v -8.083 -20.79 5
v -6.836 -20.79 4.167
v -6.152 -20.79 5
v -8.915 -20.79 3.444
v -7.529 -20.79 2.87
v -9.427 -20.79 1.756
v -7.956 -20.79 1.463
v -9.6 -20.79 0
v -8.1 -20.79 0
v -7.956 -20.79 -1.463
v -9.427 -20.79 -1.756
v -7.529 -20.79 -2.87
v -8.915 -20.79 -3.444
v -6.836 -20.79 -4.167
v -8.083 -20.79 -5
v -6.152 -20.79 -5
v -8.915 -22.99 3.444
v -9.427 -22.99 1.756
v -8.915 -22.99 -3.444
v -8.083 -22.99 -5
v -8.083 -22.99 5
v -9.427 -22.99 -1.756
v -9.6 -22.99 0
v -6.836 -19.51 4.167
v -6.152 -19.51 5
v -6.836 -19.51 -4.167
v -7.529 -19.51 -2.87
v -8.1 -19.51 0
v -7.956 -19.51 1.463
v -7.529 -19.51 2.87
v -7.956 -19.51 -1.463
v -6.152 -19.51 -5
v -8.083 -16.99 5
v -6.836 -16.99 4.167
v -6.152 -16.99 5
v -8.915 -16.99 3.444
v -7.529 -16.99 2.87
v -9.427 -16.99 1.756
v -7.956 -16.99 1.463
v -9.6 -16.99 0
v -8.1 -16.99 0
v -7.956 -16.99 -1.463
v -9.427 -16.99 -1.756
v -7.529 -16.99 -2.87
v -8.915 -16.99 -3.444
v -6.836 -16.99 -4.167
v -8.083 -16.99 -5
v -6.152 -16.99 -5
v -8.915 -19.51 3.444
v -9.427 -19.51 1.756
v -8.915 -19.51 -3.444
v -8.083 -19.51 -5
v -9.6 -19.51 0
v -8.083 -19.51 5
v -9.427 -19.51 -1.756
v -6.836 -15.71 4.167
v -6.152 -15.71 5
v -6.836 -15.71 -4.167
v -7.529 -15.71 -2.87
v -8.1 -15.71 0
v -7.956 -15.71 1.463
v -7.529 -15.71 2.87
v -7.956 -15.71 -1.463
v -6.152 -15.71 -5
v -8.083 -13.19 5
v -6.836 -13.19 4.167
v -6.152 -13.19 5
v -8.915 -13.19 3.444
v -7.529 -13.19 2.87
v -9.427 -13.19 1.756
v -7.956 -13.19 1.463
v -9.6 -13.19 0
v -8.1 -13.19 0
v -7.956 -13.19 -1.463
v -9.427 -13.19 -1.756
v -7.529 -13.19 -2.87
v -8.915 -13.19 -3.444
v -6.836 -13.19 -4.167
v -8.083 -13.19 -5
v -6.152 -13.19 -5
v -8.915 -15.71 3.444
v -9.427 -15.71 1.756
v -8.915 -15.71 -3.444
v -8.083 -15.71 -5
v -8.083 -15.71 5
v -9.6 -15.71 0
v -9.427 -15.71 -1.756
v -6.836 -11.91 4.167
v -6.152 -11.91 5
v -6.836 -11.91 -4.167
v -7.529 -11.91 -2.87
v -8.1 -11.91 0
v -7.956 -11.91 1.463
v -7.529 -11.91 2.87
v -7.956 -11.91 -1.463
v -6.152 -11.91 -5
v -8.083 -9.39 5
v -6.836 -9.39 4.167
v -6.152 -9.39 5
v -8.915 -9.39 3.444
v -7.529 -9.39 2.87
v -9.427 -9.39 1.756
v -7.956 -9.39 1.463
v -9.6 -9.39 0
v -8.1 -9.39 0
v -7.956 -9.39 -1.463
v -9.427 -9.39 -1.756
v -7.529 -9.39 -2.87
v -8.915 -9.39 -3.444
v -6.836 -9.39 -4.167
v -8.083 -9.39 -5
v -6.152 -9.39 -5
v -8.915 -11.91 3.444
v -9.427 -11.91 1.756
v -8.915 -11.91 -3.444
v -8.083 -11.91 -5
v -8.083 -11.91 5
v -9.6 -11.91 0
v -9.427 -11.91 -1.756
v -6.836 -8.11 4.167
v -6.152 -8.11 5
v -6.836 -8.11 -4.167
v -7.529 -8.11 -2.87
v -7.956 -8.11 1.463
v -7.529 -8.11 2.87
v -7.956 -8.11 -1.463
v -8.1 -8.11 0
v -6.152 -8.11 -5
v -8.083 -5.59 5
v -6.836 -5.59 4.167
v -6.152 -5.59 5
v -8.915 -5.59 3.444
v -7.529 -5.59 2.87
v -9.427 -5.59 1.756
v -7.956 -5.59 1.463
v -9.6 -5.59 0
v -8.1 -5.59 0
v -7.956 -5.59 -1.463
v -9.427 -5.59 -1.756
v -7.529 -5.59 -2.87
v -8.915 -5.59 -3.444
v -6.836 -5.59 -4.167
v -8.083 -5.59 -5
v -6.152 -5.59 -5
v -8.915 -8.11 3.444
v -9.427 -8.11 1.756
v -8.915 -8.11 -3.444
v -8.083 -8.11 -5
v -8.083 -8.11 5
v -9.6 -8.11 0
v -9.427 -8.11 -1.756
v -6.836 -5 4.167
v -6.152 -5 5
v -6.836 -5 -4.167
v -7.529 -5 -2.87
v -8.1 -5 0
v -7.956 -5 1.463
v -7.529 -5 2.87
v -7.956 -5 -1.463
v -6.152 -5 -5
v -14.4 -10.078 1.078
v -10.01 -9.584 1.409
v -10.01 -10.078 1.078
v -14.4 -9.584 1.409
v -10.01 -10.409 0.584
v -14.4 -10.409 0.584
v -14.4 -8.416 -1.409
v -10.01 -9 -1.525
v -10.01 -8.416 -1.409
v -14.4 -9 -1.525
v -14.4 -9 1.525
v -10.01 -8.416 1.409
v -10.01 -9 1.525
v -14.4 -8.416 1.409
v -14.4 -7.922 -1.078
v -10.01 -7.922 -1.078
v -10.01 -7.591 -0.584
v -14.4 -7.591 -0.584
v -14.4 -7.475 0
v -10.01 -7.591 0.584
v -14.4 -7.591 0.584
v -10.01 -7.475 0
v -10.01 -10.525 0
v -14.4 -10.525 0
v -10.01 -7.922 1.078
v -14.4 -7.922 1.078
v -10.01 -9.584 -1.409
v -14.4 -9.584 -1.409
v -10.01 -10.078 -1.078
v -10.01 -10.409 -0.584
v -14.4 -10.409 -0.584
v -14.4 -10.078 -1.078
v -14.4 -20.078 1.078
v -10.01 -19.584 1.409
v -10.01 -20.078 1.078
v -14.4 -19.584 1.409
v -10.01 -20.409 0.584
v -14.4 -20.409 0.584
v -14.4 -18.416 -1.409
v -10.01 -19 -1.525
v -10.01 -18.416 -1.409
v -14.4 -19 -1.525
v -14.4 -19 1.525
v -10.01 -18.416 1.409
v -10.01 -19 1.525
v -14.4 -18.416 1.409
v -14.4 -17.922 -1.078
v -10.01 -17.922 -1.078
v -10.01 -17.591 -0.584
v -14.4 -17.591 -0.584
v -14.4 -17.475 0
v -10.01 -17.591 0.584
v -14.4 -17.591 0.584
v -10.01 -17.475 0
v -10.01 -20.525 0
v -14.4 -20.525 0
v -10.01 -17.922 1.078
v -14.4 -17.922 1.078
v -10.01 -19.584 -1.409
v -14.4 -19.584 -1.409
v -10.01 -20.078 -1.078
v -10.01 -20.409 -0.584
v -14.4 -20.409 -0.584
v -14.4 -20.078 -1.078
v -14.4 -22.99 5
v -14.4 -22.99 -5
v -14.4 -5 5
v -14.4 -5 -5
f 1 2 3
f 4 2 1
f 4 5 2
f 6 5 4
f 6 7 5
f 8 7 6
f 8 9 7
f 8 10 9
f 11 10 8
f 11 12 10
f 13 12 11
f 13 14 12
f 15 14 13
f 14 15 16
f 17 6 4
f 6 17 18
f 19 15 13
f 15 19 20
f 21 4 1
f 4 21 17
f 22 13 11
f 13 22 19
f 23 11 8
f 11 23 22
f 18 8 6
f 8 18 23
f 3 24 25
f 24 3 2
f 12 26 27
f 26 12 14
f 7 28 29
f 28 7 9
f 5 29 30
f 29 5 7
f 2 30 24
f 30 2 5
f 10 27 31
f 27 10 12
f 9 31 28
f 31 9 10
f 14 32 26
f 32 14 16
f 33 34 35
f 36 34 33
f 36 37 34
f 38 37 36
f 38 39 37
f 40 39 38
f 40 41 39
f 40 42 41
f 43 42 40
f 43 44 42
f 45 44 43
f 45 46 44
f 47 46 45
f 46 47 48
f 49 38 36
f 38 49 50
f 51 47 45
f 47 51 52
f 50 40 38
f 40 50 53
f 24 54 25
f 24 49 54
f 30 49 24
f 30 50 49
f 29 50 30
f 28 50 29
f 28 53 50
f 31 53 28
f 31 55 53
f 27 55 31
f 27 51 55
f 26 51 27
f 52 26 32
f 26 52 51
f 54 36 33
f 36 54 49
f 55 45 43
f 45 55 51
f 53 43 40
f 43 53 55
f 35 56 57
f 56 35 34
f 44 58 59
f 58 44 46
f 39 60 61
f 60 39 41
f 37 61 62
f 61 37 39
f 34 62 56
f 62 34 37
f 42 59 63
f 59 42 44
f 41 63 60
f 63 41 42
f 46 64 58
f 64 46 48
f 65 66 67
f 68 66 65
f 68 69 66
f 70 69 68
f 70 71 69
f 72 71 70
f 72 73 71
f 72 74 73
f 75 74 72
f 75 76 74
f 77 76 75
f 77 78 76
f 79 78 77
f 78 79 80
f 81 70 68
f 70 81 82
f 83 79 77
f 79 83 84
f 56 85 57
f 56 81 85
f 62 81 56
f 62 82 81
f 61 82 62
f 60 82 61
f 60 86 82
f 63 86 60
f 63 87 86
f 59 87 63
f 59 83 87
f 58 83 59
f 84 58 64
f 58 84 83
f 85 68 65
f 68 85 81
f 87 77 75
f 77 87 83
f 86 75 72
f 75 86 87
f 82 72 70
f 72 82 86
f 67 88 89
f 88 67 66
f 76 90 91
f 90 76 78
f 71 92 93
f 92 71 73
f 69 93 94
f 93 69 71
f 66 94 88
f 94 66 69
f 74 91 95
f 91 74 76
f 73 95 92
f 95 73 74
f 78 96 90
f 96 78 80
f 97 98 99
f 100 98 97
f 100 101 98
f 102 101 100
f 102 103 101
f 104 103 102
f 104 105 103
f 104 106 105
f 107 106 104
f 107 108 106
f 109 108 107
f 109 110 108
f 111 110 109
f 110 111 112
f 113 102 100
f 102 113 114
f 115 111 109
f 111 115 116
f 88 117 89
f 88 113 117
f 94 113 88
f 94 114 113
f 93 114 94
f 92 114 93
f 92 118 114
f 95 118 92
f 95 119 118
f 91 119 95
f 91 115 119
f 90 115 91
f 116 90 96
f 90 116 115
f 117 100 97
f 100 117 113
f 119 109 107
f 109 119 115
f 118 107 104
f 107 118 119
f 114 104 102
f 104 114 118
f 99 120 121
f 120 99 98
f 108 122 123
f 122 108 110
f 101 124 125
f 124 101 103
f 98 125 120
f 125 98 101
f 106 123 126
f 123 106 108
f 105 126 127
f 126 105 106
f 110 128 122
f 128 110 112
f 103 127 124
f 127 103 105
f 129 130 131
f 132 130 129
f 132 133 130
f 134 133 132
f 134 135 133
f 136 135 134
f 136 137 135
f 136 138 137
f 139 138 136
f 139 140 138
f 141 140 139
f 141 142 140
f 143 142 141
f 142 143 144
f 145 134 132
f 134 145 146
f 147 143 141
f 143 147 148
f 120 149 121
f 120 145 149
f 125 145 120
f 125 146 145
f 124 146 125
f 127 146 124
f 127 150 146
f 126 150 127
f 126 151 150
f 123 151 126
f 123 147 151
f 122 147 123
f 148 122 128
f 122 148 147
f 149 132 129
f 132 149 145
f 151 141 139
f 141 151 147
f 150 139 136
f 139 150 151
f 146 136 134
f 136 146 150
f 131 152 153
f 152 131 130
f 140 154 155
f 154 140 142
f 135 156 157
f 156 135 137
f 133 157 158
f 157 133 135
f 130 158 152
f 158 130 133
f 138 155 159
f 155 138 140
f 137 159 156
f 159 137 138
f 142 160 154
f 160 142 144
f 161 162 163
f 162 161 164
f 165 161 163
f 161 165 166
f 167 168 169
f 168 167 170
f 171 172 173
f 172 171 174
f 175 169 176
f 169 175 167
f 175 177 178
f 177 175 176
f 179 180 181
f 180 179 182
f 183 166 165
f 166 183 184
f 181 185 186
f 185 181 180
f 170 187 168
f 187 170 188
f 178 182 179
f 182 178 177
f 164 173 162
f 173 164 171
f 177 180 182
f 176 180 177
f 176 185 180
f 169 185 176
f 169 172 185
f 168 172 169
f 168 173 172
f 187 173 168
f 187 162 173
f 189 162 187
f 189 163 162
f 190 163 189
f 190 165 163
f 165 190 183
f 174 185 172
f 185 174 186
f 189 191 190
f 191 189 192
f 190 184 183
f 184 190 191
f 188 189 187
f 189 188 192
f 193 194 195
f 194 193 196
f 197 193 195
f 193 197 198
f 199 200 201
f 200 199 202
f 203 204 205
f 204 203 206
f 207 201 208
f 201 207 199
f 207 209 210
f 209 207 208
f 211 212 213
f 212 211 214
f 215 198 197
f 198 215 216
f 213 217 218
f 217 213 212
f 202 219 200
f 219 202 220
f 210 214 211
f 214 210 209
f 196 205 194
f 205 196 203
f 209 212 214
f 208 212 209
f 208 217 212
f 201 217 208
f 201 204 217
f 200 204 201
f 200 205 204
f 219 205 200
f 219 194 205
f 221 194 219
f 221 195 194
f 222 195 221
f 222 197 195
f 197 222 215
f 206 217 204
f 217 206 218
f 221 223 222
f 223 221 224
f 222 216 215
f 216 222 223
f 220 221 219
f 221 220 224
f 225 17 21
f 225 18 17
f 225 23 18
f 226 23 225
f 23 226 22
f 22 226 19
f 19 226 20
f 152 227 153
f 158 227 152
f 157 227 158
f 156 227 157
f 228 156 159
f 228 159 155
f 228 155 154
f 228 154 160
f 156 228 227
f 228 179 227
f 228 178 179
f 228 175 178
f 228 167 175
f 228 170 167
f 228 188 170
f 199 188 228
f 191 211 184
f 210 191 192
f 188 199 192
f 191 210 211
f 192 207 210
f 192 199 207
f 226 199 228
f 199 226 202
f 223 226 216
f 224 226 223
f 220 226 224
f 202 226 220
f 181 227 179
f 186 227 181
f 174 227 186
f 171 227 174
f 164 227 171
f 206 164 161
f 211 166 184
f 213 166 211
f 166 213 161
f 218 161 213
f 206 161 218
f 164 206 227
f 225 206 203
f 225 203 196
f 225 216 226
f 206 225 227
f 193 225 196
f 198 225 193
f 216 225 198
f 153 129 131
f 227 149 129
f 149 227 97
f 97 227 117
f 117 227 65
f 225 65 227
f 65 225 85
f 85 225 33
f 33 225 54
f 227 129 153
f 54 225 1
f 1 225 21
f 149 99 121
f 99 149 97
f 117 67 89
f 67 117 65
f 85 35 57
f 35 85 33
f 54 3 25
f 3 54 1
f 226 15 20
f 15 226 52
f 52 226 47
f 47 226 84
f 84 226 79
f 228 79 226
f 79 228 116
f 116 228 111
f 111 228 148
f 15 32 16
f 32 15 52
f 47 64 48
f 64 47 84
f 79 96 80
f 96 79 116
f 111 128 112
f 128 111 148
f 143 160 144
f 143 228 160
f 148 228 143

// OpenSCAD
// file: common.scad
// CoreBeam Laser Engraver
//
// Licence: CC BY-SA 3.0, http://creativecommons.org/licenses/by-sa/3.0/
// Author: Dominik Scholz <schlotzz@schlotzz.com>
// visit: http://www.schlotzz.com
//
// definitions of common values



// avoid openscad artefacts in preview
epsilon = 0.01;

// increase this if your slicer or printer make holes too tight
extra_radius = 0.1;

// major diameter of metric 3mm thread
m3_major = 2.85;
m3_radius = m3_major / 2 + extra_radius;
m3_wide_radius = m3_major / 2 + extra_radius + 0.2;
m3_small_radius = m3_radius - 0.1;

// diameter of metric 3mm hexnut screw head
m3_head_radius = 3 + extra_radius;

// nema 17 dimensions
nema17_width = 42.3;
nema17_hole_offsets = [
	[-15.5, -15.5, 0],
	[-15.5,  15.5, 0],
	[ 15.5, -15.5, 0],
	[ 15.5,  15.5, 0]
];


// hole for retaining a m3 hexnut
module m3_hexnut_cutout(additional_height = 0)
{
	cylinder(r = 3.15 + 2.5 * extra_radius, h = 2.5 + 3 * extra_radius + additional_height, $fn = 6);
}


// rounded rectangle
module roundedRectangle(size, radius)
{
	cube([size[0], size[1] - radius * 2, size[2]], true);
	cube([size[0] - radius * 2, size[1], size[2]], true);

	for (x = [-size[0] / 2 + radius, size[0] / 2 - radius])
		for (y = [-size[1] / 2 + radius, size[1] / 2 - radius])
			translate([x, y, 0])
				cylinder(size[2], radius, radius, true);
}


// rounded trapezoid
module roundedTrapezoid(size, radius, bottom)
{
	hull()
	{
		// bottom
		for (i = [[-bottom / 2 + radius, radius, 0], [bottom / 2 - radius, radius, 0]])
			translate(i)
				cylinder(r = radius, h = size[2], $fn = 32);

		// top
		for (i = [[-size[0] / 2 + radius, size[1] - radius, 0], [size[0] / 2 - radius, size[1] - radius, 0]])
			translate(i)
				cylinder(r = radius, h = size[2], $fn = 32);


	}

}


// hole for wood screw 4x15, countersunk head
module woodscrew_cutout()
{
	translate([0, 0, -epsilon])
		cylinder(r = 2.0, h = 3 + epsilon * 2, $fn = 16);

	translate([0, 0, 3])
		cylinder(r1 = 2.0, r2 = 4.2, h = 2.25, $fn = 16);

	translate([0, 0, 5.25 - epsilon])
		cylinder(r = 4.2, h = 30, $fn = 16);
}
// main file
// CoreBeam Laser Engraver
//
// Licence: CC BY-SA 3.0, http://creativecommons.org/licenses/by-sa/3.0/
// Author: Dominik Scholz <schlotzz@schlotzz.com>
// visit: http://www.schlotzz.com
//
// laser module tower


// include files
include <common.scad>;



// laser metal casing with cooling fins
module laser_metal_casing(extra_space = 0)
{
	h = 1.90;
	for (i = [1:10])
	{
		translate([0, 0, -i * 2 * h + h - epsilon - extra_space / 2])
			cylinder(r = 9, h = h + 2 * epsilon + extra_space, $fn = 32);
		translate([0, 0, -i * 2 * h])
			cylinder(r = 7.5, h = h, $fn = 32);
	}
}


// laser tower
module laser_tower()
{
	width = 40;
	height = 40;
	depth = 25;
	fan_holes = [
		[-16, -16, 0],
		[-16,  16, 0],
		[ 16, -16, 0],
		[ 16,  16, 0]
	];
	mounting_holes = [
		[-8, -20, 0],
		[-8,  20, 0],
		[ 8, -20, 0],
		[ 8,  20, 0]
	];
	cable_cutout_width = 3;
	cable_cutout_depth = 2;

	difference()
	{
	
		union()
		{
			// main body
			translate([0, 0, depth / 2])
				roundedRectangle([width, height, depth], 3, $fn = 32);

			// mounting hole enforcements
			for (i = mounting_holes)
				translate(i)
					cylinder(r = m3_head_radius + 2, h = 3, $fn = 32);
		}

		// main cutout
		translate([0, 0, depth / 2])
			roundedRectangle([30, 30, depth + 2 * epsilon], 3, $fn = 32);

		// mounting holes for fan
		for (i = fan_holes)
			translate(i - [0, 0, -depth + 7])
				cylinder(r = m3_small_radius, h = 7 + epsilon, $fn = 16);

		// cable outlet
		translate([-cable_cutout_width / 2, 0, depth - cable_cutout_depth + epsilon])
			cube([cable_cutout_width, width, cable_cutout_depth + epsilon]);

		// mounting holes for laser casing
		for (z = [9, 19])
			translate([0, 0, z])
				rotate([0, 90, 0])
					cylinder(r = m3_radius, h = width + 2 * epsilon, center = true, $fn = 16);

		// mounting holes for tool
		for (i = mounting_holes)
		{
			translate(i - [0, 0, epsilon])
			{
				// screw cutout
				translate([0, 0, 0])
					cylinder(r = m3_wide_radius, h = depth * 2 + epsilon, $fn = 16);

				// head cutout
				translate([0, 0, 3])
					cylinder(r = m3_head_radius, h = depth * 2 + epsilon, $fn = 16);
			}
		}
	}

	// show laser casing
	%translate([0, 0, depth - 2])
		laser_metal_casing();
}


// laser module holder within tower
module laser_holder()
{
	width = 10;
	extra_width = -1.2 / 2;
	height = 10;
	radius = 10;
	depth = 18;
	extra_space = 0.6;

	difference()
	{
		// base
		translate([-15 + extra_space, -height / 2, 25 - depth - 2])
			cube([width, height, depth - epsilon]);

		// laser casing cutout
		translate([extra_width, 0, 25 - 2])
			laser_metal_casing(extra_space);

		// mounting holes
		for (z = [9, 19])
			translate([-15 - epsilon, 0, z])
				rotate([0, 90, 0])
					cylinder(r = m3_radius, h = 5, $fn = 16);
	}
}


// laser module end cap
module laser_end_cap()
{
	
	width = 32;
	height = 32;
	depth = 15;
	out_radius = 10;
	mounting_holes = [
		[-8, -20, 0],
		[-8,  20, 0],
		[ 8, -20, 0],
		[ 8,  20, 0]
	];

	difference()
	{
	
		union()
		{
			// main body
			intersection()
			{
				translate([0, 0, depth / 2])
					roundedRectangle([width, height, depth], 3, $fn = 32);
				cylinder(r1 = width * 0.75, r2 = out_radius + 2, h = depth, $fn = 64);
			}

			// mounting hole enforcements
			translate([-13, -20, 0])
				cube([26, 40, 3]);
			for (i = mounting_holes)
				translate(i)
					cylinder(r = m3_head_radius + 2, h = 3, $fn = 32);
		}

		// main cutout
		translate([0, 0, -epsilon])
			intersection()
			{
				translate([0, 0, depth / 2])
					roundedRectangle([30, 30, depth + 2 * epsilon], 3, $fn = 32);
				cylinder(r1 = width * 0.75 - 2, r2 = out_radius, h = depth, $fn = 64);
			}
		cylinder(r = out_radius, h = depth  + epsilon, $fn = 64);

		// mounting holes for tool
		for (i = mounting_holes)
		{
			translate(i - [0, 0, epsilon])
			{
				// screw cutout
				translate([0, 0, 0])
					cylinder(r = m3_wide_radius, h = depth * 2 + epsilon, $fn = 16);

				// head cutout
				translate([0, 0, 4])
					cylinder(r = m3_head_radius, h = depth * 2 + epsilon, $fn = 16);
			}
		}
	}



}



//laser_end_cap();
//laser_tower();
rotate([90, 0, 0])
	laser_holder();
